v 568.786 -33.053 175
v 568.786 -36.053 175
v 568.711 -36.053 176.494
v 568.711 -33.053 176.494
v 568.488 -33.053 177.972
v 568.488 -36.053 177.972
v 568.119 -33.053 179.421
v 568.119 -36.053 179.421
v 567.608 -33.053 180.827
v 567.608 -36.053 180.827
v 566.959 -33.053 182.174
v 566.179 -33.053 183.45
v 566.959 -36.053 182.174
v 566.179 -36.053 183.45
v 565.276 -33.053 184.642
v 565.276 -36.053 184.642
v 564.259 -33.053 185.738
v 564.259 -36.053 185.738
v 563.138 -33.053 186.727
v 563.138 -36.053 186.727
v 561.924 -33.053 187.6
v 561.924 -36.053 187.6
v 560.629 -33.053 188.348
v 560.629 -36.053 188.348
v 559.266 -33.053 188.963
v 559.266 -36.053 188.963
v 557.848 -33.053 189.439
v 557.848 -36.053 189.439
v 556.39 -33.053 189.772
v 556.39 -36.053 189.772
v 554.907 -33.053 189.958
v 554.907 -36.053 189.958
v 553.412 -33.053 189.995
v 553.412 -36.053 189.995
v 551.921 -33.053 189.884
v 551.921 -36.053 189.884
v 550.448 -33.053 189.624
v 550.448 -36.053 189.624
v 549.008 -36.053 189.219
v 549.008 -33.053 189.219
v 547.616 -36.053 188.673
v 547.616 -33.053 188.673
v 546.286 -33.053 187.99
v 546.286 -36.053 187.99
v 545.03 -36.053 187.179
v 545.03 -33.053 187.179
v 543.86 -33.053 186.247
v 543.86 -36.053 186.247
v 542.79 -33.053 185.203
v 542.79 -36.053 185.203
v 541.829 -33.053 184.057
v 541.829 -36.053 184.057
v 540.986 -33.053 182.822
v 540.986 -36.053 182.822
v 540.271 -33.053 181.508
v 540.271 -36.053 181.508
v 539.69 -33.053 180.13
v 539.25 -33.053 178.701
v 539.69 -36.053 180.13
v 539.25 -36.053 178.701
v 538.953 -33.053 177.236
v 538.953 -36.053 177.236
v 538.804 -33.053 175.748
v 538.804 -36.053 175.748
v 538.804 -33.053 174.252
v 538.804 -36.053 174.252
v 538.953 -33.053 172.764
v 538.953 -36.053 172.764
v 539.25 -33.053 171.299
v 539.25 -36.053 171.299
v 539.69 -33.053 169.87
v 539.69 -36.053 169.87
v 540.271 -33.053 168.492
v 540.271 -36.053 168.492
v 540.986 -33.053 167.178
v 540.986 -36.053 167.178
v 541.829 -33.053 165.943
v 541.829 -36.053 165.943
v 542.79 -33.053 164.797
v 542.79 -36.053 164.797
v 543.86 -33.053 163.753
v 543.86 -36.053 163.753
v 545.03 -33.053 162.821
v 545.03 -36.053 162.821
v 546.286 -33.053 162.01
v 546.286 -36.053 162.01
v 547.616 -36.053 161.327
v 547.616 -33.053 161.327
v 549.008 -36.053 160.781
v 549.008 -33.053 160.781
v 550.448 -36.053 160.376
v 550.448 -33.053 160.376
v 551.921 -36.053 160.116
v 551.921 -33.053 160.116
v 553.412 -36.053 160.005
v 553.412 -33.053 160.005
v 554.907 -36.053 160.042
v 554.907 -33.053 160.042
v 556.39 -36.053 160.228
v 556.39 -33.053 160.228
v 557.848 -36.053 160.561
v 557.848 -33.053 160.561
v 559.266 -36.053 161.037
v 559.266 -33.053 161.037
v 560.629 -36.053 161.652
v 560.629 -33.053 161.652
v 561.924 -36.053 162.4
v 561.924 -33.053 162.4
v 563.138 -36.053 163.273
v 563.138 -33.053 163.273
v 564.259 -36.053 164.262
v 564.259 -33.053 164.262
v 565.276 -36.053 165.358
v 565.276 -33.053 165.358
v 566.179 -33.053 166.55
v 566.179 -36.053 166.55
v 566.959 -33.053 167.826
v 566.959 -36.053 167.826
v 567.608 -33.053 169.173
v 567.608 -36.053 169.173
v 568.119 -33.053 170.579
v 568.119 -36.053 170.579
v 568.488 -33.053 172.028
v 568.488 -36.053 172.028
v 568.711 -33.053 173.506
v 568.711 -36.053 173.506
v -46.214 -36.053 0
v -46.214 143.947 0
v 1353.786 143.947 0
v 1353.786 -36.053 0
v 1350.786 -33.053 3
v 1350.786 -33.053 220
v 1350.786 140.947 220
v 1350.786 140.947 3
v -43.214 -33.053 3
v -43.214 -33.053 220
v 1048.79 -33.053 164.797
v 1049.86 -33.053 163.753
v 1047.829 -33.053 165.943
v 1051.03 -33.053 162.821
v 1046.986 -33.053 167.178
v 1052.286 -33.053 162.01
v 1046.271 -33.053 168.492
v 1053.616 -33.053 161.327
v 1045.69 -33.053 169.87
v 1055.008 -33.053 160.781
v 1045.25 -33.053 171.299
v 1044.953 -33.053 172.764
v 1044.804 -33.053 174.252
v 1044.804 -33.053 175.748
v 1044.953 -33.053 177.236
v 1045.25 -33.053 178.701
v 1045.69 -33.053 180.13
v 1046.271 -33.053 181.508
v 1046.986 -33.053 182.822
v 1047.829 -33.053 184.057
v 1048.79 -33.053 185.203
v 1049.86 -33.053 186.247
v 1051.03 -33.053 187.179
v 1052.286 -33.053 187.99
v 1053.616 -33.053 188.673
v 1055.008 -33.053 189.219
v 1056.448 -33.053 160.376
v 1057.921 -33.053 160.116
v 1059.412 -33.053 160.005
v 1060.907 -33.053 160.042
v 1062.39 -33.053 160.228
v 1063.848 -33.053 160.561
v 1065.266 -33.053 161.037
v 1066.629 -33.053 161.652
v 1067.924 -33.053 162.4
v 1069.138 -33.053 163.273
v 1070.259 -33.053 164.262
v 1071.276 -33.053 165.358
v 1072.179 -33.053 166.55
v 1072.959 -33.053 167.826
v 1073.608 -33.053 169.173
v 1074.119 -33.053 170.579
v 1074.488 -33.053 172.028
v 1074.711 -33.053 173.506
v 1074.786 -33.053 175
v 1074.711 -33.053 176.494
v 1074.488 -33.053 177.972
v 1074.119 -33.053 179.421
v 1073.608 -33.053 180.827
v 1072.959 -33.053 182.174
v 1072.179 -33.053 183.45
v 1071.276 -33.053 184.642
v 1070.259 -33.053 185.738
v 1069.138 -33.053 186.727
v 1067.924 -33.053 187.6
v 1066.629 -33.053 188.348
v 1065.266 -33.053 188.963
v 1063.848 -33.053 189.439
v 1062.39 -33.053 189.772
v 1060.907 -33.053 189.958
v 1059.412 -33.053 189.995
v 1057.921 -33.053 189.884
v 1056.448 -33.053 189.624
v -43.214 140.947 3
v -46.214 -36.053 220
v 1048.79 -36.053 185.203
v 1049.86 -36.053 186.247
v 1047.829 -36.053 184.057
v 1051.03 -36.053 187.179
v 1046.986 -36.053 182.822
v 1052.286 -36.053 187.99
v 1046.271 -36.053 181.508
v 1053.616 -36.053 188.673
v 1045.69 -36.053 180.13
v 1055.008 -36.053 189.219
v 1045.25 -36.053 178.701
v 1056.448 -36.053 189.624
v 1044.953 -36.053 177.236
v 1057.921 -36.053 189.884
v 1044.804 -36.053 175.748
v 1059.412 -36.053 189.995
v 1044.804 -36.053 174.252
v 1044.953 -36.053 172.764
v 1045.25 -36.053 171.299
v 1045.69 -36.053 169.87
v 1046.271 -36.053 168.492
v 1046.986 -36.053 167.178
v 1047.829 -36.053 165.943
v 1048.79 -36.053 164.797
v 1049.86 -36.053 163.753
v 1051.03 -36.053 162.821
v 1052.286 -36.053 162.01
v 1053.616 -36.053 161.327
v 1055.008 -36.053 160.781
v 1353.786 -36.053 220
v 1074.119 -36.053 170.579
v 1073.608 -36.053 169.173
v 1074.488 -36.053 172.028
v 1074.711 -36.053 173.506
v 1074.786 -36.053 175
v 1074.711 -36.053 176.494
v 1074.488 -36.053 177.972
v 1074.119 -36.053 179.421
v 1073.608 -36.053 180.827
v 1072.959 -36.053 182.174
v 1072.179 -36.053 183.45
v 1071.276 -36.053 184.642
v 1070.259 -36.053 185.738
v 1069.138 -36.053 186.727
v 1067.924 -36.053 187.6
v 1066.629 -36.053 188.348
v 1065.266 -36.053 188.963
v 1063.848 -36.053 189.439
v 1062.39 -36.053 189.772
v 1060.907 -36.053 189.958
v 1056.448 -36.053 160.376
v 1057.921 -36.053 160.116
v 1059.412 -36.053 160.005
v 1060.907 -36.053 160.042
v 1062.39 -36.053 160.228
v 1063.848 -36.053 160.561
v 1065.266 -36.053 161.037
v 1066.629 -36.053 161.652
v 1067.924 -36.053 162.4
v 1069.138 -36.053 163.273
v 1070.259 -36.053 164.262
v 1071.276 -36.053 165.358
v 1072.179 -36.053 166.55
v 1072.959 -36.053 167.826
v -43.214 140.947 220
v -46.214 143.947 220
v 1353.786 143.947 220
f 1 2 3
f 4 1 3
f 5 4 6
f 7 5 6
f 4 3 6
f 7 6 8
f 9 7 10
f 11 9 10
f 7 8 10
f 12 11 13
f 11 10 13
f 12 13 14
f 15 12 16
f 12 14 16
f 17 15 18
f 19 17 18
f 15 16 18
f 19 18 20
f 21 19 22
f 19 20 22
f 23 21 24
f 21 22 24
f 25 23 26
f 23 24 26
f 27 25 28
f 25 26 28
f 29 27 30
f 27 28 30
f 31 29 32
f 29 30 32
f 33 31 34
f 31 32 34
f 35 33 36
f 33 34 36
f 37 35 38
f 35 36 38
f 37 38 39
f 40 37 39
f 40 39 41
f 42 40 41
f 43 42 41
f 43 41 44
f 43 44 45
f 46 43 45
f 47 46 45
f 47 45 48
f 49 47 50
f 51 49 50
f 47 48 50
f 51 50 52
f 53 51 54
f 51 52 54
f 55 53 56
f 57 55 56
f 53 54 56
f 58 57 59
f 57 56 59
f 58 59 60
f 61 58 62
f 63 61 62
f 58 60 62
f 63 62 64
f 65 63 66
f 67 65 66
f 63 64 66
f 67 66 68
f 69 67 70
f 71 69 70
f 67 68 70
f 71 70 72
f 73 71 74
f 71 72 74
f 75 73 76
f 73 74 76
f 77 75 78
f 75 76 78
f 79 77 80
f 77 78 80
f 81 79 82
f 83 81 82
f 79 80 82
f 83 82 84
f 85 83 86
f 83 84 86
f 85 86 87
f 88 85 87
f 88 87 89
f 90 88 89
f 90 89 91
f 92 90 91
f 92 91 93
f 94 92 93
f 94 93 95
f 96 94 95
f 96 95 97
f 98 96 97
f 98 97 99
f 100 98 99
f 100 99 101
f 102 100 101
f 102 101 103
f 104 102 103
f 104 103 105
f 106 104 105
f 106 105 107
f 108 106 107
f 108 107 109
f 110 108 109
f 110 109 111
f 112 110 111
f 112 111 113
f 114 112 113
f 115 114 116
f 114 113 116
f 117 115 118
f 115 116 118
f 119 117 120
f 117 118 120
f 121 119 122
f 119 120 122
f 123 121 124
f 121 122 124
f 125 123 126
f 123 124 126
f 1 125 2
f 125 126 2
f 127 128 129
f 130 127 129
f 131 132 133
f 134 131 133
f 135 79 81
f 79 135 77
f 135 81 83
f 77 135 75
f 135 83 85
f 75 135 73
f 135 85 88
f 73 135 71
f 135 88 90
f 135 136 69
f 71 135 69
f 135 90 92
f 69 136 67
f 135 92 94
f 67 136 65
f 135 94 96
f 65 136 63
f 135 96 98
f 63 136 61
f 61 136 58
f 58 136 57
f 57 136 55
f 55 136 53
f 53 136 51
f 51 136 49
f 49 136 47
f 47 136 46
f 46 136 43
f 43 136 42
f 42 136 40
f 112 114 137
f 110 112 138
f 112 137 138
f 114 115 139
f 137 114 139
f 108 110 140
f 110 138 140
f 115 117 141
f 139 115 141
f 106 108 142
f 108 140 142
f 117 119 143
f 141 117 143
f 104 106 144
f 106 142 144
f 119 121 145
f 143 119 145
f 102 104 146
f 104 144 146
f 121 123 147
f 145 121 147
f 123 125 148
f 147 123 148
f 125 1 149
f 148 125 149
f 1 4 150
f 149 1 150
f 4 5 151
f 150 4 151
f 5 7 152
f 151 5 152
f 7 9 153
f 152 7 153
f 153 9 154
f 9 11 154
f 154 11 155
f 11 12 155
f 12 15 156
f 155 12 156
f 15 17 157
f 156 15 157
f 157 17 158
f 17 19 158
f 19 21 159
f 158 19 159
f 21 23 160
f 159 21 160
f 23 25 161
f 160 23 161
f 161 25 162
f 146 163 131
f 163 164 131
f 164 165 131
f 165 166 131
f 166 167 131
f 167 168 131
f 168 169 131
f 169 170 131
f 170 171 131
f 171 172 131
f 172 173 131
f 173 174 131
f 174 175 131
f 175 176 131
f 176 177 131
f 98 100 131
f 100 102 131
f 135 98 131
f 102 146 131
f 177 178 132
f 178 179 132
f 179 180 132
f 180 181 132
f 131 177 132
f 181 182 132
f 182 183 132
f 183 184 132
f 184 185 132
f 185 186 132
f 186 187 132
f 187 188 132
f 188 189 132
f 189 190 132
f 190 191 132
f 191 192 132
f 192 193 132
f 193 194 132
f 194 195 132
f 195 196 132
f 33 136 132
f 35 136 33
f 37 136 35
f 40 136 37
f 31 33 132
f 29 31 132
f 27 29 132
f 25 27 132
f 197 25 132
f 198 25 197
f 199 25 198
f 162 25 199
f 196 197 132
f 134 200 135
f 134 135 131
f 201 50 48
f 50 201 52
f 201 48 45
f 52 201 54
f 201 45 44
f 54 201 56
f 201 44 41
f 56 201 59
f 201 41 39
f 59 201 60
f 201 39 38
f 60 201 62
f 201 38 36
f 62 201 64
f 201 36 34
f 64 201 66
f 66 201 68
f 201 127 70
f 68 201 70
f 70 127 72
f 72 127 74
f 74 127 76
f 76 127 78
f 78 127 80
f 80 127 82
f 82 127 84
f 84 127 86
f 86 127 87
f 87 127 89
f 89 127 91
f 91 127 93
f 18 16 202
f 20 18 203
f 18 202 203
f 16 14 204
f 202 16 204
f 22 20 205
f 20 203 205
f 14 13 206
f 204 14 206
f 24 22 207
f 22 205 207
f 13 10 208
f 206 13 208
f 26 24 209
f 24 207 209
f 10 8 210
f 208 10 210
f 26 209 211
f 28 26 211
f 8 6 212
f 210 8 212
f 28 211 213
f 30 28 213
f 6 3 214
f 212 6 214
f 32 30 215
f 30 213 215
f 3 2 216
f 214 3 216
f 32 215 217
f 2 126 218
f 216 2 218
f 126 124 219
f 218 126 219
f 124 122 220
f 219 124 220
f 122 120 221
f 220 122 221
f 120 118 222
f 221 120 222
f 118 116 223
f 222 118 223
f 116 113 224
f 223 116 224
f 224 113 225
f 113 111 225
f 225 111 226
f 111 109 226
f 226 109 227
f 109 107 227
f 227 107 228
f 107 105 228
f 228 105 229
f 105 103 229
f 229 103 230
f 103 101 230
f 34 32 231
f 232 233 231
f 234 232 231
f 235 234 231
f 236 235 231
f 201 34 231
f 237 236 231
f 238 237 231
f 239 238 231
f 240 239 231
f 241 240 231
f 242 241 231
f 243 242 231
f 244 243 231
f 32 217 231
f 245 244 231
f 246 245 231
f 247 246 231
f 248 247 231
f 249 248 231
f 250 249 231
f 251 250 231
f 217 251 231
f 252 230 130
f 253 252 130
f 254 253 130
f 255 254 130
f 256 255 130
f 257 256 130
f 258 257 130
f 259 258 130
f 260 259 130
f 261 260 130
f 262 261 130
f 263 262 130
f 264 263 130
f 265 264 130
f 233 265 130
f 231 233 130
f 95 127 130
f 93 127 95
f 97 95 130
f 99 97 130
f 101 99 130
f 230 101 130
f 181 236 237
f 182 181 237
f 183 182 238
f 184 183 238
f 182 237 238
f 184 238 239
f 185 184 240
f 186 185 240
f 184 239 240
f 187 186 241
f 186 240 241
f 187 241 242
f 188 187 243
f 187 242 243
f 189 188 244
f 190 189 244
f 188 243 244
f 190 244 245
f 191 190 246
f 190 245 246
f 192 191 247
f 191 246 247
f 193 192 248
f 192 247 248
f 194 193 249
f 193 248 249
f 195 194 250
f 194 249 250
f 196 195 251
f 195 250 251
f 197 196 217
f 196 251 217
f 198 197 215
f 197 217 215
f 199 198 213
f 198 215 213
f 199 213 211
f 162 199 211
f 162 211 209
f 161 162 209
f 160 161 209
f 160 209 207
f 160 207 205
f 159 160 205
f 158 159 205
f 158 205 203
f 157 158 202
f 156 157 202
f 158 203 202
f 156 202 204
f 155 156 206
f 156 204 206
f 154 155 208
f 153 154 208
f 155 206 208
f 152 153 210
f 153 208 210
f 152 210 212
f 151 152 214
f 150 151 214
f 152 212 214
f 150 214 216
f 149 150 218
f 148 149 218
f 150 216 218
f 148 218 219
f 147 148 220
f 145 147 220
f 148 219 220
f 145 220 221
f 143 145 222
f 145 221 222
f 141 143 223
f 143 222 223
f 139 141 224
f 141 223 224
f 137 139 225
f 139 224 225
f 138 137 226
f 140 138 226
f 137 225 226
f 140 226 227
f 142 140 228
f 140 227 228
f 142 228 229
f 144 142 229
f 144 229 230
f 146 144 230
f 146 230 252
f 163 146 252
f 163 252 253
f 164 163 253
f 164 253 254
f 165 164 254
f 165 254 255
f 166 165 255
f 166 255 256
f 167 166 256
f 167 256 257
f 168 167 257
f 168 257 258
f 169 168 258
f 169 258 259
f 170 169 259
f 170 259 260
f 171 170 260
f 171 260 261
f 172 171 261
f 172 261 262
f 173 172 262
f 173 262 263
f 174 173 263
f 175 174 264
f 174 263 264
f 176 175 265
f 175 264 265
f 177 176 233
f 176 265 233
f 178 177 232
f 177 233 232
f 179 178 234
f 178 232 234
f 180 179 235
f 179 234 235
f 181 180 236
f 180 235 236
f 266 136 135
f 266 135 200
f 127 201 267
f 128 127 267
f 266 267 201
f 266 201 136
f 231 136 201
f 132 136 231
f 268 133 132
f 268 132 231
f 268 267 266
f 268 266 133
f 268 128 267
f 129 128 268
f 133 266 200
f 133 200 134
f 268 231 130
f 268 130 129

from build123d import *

# Parameters (mm, degrees)
F0_W     = 1400
F0_H     = 180
F1_DEPTH = 220
F2_W     = 1394
F2_H     = 174
F3_DEPTH = 217
F4_R     = 15
F5_DEPTH = 3


with BuildPart() as f1:
    # F0 (on Top) → F1 (new body)
    with BuildSketch(Plane.XY):
        with Locations((653.785665, 53.946961)):
            Rectangle(F0_W, F0_H)
    extrude(amount=F1_DEPTH)

    # F2 (on face) → F3 (cut)
    with BuildSketch(Plane.XY.offset(220)):
        with Locations((653.785665, 53.946961)):
            Rectangle(F2_W, F2_H)
    extrude(amount=-F3_DEPTH, mode=Mode.SUBTRACT)

    # F4 (on face) → F5 (cut, through all)
    with BuildSketch(Plane.XZ.offset(36.053039)):
        with Locations((553.785665, 175)):
            Circle(F4_R)
        with Locations((1059.785665, 175)):
            Circle(F4_R)
    extrude(amount=-F5_DEPTH, mode=Mode.SUBTRACT)


solid = f1.part
